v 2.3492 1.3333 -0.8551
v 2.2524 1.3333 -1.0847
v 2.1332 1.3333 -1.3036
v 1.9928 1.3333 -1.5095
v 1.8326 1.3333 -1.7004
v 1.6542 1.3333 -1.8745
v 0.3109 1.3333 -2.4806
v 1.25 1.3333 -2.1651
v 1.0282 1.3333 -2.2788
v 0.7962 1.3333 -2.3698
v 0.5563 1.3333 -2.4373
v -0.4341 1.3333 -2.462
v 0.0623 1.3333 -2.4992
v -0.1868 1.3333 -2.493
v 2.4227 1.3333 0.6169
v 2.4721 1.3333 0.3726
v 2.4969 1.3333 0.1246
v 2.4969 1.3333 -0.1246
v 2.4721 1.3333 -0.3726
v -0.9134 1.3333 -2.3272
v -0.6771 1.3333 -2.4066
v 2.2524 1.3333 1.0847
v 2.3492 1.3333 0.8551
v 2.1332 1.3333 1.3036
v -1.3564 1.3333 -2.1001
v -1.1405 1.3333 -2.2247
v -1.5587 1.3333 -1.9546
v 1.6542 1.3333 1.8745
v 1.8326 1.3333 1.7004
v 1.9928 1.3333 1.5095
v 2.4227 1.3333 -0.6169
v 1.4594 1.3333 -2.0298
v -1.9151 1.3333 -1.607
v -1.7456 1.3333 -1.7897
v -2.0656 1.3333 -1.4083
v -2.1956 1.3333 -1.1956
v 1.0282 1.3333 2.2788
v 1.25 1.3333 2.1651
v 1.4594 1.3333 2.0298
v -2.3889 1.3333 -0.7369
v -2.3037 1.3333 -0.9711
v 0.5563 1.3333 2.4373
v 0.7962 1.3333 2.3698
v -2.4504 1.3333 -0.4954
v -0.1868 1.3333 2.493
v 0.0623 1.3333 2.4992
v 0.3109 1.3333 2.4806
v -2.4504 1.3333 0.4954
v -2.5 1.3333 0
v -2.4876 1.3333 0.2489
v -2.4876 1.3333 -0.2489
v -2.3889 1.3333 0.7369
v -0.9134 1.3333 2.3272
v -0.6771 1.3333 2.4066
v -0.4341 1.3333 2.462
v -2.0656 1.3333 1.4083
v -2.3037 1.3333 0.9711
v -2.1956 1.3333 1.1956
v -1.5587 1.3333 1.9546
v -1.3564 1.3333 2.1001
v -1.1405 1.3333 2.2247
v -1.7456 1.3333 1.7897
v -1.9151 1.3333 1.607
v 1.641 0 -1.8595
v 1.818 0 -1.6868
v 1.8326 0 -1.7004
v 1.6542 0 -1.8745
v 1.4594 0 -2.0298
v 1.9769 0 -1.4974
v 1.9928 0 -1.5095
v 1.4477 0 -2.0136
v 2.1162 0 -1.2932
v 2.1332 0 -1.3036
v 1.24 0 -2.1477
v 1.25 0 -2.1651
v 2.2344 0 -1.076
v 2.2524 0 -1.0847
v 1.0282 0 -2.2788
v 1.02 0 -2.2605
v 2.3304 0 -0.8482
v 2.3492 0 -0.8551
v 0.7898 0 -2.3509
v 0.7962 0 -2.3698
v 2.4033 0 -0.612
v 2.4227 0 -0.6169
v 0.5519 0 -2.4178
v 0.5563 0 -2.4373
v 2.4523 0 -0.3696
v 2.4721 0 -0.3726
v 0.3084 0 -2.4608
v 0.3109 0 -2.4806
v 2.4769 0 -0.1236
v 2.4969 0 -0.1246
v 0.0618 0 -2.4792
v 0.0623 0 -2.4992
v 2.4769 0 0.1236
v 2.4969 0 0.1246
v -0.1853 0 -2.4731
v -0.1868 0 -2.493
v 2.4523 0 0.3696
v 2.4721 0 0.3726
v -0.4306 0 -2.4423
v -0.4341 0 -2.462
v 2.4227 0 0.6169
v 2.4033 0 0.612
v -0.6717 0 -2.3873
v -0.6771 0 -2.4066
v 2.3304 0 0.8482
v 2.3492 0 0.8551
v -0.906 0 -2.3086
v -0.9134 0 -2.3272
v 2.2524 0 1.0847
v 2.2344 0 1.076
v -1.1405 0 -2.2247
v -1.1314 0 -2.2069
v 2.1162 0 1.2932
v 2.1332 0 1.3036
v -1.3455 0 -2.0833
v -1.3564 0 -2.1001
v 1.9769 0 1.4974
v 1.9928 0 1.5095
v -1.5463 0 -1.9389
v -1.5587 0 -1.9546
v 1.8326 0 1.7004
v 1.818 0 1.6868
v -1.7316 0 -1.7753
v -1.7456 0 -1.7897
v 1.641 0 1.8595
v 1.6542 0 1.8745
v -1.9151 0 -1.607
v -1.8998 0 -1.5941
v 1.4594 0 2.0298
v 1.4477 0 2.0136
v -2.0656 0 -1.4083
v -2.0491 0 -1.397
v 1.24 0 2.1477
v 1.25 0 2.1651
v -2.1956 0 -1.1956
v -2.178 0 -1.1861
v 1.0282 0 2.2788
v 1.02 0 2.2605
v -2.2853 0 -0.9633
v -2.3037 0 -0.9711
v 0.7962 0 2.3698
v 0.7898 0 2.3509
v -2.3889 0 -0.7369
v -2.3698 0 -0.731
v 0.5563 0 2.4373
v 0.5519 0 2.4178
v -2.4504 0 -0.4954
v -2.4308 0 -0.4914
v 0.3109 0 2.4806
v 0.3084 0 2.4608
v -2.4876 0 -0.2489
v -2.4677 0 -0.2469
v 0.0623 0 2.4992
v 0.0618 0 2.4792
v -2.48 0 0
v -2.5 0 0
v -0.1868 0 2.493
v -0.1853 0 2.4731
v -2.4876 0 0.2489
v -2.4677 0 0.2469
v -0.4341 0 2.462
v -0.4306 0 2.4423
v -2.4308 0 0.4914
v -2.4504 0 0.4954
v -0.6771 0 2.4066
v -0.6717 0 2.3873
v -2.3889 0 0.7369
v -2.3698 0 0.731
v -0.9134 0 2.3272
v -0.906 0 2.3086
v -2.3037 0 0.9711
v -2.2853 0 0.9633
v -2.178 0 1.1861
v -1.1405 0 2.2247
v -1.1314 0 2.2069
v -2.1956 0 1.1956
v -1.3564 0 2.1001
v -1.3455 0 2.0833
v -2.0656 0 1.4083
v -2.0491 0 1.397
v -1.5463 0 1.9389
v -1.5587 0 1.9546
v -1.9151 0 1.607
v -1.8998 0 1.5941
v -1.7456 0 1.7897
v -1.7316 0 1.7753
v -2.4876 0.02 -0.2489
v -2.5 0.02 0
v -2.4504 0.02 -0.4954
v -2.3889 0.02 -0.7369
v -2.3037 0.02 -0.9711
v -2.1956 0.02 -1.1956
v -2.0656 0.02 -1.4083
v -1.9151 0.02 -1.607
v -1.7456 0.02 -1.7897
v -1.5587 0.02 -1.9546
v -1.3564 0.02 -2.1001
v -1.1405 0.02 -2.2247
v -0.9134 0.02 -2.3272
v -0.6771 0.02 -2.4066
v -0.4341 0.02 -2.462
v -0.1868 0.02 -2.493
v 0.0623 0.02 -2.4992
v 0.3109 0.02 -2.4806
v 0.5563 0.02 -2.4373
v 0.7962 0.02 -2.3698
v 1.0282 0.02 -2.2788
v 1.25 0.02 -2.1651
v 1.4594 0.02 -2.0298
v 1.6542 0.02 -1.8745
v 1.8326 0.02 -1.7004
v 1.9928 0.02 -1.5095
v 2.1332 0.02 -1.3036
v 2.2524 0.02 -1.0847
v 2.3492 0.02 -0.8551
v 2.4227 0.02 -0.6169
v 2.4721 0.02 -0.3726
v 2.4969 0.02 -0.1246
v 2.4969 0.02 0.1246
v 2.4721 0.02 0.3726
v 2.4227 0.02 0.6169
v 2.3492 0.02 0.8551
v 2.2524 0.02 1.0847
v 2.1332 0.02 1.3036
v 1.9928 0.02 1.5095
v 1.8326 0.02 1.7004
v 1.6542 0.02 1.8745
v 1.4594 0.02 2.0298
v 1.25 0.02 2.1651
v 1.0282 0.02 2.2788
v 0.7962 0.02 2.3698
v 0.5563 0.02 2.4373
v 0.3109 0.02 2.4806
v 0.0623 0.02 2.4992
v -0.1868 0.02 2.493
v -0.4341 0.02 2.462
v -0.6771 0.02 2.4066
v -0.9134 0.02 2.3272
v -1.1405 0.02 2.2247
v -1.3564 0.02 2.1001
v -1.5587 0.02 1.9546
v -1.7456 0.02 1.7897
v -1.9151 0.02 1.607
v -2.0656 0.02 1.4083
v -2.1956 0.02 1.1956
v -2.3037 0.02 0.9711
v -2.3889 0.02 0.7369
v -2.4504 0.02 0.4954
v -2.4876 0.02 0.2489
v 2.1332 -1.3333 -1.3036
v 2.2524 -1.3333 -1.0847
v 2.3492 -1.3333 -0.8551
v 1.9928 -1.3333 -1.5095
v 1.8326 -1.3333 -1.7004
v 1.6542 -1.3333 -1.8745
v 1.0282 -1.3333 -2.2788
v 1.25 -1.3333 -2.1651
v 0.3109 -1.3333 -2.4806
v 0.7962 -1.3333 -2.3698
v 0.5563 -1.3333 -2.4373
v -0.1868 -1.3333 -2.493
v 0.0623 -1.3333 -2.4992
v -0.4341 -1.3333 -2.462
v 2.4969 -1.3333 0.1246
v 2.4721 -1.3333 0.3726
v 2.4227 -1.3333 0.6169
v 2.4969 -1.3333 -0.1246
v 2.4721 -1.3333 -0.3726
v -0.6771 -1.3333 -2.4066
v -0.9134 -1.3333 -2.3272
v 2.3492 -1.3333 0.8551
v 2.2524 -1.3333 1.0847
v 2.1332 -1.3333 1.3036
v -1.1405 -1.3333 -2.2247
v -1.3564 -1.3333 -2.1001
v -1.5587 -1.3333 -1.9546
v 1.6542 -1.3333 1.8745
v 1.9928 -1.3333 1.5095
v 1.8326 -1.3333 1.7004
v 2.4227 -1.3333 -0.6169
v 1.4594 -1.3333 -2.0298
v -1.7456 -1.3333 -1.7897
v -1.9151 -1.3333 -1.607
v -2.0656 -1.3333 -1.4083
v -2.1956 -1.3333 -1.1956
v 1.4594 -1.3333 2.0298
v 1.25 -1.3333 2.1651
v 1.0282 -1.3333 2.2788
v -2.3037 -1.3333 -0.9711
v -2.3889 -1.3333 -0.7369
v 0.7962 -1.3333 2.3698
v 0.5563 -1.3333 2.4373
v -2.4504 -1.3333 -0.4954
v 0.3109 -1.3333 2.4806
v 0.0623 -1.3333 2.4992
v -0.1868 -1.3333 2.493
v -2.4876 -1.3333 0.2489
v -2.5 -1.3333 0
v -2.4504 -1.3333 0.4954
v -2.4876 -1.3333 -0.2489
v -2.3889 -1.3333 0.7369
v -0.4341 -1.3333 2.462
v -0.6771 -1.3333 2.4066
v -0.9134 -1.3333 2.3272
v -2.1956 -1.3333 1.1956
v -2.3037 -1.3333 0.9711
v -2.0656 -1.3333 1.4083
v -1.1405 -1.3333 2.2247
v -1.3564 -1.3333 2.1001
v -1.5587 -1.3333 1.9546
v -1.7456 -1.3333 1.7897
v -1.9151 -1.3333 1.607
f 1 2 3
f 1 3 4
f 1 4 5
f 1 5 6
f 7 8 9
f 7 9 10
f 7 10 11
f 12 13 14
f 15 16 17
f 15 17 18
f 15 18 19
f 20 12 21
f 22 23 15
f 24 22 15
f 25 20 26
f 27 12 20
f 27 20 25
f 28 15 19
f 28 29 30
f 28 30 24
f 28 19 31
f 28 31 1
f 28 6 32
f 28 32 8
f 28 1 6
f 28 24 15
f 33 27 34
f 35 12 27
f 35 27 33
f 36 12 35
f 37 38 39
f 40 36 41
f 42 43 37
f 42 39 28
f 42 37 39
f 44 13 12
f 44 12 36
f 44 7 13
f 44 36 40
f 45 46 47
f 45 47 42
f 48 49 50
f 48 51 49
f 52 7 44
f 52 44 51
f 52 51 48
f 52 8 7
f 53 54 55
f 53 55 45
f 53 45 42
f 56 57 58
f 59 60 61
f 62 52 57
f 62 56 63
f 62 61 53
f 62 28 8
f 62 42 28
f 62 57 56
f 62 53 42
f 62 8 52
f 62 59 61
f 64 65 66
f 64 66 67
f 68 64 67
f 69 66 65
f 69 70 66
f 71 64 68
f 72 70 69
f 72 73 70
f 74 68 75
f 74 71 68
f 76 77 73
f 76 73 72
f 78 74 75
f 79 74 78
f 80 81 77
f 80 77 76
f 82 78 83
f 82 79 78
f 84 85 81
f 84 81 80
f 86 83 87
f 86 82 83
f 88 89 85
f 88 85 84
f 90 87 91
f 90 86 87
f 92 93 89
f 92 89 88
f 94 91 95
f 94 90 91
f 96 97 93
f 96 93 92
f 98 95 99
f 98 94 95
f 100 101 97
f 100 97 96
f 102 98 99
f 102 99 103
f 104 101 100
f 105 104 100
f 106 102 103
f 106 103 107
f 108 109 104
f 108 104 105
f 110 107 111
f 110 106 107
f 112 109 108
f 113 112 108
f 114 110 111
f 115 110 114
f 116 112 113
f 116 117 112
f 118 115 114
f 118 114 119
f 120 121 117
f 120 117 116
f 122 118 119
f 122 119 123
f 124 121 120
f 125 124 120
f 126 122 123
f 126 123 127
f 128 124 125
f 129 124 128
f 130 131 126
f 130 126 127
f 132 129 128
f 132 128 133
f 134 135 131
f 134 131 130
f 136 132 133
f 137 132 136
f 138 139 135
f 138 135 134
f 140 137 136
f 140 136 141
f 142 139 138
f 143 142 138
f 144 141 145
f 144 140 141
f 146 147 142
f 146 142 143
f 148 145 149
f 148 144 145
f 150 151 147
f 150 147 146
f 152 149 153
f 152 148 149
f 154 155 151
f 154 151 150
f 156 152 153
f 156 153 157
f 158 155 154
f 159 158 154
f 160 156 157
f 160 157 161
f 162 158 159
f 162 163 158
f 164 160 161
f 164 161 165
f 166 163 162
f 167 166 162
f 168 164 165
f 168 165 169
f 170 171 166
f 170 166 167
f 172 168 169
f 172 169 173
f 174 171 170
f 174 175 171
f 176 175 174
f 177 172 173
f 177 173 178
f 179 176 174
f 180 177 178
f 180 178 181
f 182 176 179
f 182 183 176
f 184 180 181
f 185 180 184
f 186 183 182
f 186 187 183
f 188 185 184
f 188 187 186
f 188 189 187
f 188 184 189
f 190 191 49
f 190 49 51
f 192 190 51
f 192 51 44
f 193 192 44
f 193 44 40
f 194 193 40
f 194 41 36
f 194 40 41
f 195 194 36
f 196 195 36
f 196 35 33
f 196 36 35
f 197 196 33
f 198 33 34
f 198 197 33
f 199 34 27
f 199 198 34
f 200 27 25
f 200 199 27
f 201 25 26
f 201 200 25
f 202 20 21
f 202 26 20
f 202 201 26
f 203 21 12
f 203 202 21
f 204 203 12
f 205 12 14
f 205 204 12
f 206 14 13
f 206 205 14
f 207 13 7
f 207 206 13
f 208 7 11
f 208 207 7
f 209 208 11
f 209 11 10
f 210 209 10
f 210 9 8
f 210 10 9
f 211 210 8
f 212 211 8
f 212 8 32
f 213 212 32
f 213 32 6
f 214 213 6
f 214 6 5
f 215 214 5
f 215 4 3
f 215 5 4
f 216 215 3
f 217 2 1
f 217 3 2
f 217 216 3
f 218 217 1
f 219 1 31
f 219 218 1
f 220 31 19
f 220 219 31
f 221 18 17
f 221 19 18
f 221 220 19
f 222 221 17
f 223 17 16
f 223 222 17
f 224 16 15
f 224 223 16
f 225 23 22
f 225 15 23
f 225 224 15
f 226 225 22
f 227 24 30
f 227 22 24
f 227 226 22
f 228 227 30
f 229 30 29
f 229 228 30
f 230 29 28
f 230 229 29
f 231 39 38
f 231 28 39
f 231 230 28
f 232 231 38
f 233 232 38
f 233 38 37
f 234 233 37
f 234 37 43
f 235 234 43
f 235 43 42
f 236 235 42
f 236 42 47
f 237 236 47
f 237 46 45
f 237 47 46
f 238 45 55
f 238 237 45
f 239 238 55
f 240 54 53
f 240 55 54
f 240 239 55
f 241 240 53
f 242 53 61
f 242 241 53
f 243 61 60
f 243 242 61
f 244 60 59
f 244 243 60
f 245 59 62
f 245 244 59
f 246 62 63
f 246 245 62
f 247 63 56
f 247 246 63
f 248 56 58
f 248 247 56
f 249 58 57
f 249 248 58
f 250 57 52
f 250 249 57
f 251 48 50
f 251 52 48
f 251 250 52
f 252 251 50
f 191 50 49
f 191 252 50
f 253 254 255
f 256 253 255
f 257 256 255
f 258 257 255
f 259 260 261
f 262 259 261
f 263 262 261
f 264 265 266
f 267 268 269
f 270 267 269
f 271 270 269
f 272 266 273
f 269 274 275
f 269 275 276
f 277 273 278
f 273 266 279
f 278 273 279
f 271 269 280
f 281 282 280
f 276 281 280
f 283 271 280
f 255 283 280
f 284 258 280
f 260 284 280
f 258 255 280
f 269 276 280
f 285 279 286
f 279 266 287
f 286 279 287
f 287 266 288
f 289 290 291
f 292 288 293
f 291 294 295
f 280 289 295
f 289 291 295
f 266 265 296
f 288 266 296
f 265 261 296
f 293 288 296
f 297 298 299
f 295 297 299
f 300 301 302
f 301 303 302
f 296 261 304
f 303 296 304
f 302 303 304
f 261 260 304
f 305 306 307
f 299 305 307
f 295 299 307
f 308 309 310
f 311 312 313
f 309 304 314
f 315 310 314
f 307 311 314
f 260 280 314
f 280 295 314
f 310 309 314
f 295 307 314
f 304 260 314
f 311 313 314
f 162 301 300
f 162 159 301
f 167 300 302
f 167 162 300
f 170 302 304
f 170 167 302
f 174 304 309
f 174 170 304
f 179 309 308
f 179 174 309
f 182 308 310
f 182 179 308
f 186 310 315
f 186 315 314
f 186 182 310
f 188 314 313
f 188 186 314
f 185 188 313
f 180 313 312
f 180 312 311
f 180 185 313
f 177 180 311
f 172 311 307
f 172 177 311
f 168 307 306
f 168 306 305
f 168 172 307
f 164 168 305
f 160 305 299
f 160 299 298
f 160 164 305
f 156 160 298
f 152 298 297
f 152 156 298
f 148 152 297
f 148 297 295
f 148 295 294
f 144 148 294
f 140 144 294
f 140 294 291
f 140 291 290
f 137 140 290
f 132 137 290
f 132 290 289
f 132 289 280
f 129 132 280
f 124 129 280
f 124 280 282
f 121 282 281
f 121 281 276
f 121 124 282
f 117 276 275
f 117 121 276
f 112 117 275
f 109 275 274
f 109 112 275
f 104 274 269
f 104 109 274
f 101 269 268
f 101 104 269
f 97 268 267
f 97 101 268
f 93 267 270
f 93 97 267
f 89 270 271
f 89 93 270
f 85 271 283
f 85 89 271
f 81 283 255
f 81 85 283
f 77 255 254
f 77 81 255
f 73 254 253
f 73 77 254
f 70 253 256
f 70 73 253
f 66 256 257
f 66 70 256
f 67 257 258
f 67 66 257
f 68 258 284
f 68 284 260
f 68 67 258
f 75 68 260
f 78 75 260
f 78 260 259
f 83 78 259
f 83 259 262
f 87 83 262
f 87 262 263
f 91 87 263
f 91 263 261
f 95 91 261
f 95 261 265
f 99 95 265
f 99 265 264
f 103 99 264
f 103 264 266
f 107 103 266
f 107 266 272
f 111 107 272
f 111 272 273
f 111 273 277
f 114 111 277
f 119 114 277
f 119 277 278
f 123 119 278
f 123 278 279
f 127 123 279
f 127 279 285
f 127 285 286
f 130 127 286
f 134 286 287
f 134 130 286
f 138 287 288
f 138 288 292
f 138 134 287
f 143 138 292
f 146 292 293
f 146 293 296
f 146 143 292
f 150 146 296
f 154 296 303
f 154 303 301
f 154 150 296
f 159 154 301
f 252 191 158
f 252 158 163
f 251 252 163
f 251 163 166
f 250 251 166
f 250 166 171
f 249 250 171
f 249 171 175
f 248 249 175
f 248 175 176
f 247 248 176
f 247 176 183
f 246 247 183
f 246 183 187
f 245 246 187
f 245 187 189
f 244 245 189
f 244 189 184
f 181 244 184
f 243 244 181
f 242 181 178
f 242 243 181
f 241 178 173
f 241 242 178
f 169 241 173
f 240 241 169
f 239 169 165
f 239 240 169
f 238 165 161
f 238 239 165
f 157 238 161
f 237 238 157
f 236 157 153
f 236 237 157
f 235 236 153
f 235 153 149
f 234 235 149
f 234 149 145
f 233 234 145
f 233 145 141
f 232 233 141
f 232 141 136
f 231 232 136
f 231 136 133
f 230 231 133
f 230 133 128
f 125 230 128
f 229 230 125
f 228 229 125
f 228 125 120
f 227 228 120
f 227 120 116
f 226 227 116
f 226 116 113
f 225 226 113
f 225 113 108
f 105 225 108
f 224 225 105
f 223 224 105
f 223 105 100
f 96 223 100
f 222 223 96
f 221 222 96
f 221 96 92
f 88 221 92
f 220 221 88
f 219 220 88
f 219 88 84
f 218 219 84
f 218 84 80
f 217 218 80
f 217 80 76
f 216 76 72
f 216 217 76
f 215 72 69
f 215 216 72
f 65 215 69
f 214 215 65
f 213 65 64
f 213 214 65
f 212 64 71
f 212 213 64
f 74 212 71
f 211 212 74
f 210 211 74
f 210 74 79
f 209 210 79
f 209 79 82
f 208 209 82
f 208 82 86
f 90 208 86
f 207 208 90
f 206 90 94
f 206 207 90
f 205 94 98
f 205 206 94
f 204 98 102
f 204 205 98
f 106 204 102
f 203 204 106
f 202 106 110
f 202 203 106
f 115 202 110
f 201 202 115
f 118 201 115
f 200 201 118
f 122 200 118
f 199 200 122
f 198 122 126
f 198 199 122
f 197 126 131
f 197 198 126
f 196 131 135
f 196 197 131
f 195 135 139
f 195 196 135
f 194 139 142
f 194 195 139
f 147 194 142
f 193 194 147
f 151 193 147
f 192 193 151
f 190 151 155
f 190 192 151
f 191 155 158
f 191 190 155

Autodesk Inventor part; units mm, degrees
ref_plane "YZ Plane" through (0, 0, 0) normal (1, 0, 0) x (0, 1, 0)
ref_plane "XZ Plane" through (0, 0, 0) normal (0, 1, 0) x (-1, 0, 0)
ref_plane "XY Plane" through (0, 0, 0) normal (0, 0, 1) x (1, 0, 0)
sketch "Sketch1" plane through (0, 0, 0) normal (0, 1, 0) x (-1, 0, 0)
  circle A0 centre (0, 0) radius 2.5
  dimension "d0" = 5
extrude "Extrusion1" add sketch "Sketch1" along normal blind 1.3333
chamfer "Chamfer1" distance 0.02 angle 45 1 edges at (2.5, 0, 0)
extrude "Extrusion2" add sketch "Sketch1" against normal blind 1.3333
equation "\"d0\" = sensorMagnet_diameter"
equation "\"d1\" = 0.5 * sensorMagnet_height"
equation "\"d6\" = 0.5 * sensorMagnet_height"
equation "\"gap\" = 0.1"
equation "\"airgap\" = 0.4"
equation "\"driveMagnet_height\" = 5"
equation "\"halbachMagnet_height\" = 3"
equation "\"sensorMagnet_diameter\" = 5"
equation "\"sensorMagnet_height\" = 2.66667"
equation "\"wallgap\" = 2"
equation "\"motorRadius\" = 2 * gap + driveMagnet_centerSpacingRadius + driveMagnet_length + 2 * wallgap"
equation "\"shaftDiameter\" = 8"
equation "\"flangeBearing_outerDiameter\" = 16"
equation "\"flangeBearing_innerDiameter\" = shaftDiameter"
equation "\"flangeBearing_height\" = 5"
equation "\"flangeBearing_flangeHeight\" = 1"
equation "\"flangeBearing_flangeDiameter\" = 18"
equation "\"magnetTrapNut_height\" = 1.2"
equation "\"magnetTrapNut_sideToSide\" = 4"
equation "\"magnetTrapBolt_headHeight\" = 2"
equation "\"magnetTrapBolt_headDiameter\" = 3.98"
equation "\"magnetTrapBolt_diameter\" = 2"
equation "\"statorThickness\" = coilThickness + 2 * wallgap"
equation "\"rotor_mountingLipHeight\" = 0.5 * statorThickness"
equation "\"magnetTrapHexNut_sideToSide\" = 4"
equation "\"magnetTrapSquareNut_sideLength\" = 4"
equation "\"magnetTrapSquareNut_height\" = 1.2"
equation "\"magnetTrapHexNut_height\" = 1.2"
equation "\"rotorRadius\" = 2 * gap + driveMagnet_centerSpacingRadius + driveMagnet_length + wallgap"
equation "\"rotorBandSquareNut_sideLength\" = 4"
equation "\"rotorBandHexNut_height\" = 1.2"
equation "\"rotorBandHexNut_sideToSide\" = 4"
equation "\"rotorBandSquareNut_height\" = 1.2"
equation "\"rotorBandBolt_headHeight\" = 2"
equation "\"rotorBandBolt_headDiameter\" = 3.98"
equation "\"rotorBandBolt_diameter\" = 2"
equation "\"rotorBandThickness\" = wallgap + rotorBandBolt_headHeight + gap"
equation "\"flangeCoupling_collarOuterDiameter\" = 16"
equation "\"flangeCoupling_flangeHoleEdgeToEdge\" = 2.05"
equation "\"flangeCoupling_innerDiameter\" = shaftDiameter"
equation "\"flangeCoupling_flangeHoleDiameter\" = 3.9"
equation "\"flangeCoupling_flangeHeight\" = 3.1"
equation "\"flangeCoupling_flangeDiameter\" = 32"
equation "\"flangeCoupling_height\" = flangeCoupling_collarHeight + flangeCoupling_flangeHeight"
equation "\"flangeCoupling_mountHoleDiameter\" = 3.9"
equation "\"flangeCoupling_mountHoleEdgeToEdge\" = 2.05"
equation "\"statorRadius\" = driveMagnet_length + driveMagnet_centerSpacingRadius + 2 * gap"
equation "\"coilThickness\" = 12"
equation "\"statorMountBolt_diameter\" = 4"
equation "\"statorMountBolt_headDiameter\" = 7"
equation "\"statorMountBolt_headHeight\" = 4"
equation "\"statorMountBolt_shaftLength\" = coilThickness + flangeCoupling_flangeHeight + wallgap"
equation "\"statorMountHexNut_height\" = 4"
equation "\"statorMountHexNut_sideToSide\" = 8"
equation "\"sensorMagnet_ringRadius\" = 0.5 * driveMagnet_centerSpacingRadius + 2 * wallgap"
equation "\"coil_percentCoverage\" = 0.6"
equation "\"statorSpokeDegrees\" = 4deg"
equation "\"coil_bulge\" = 3"
equation "\"statorCoilBolt_shaftLength\" = coilThickness"
equation "\"statorCoilHexNut_height\" = 1.2"
equation "\"statorCoilBolt_headHeight\" = 2"
equation "\"statorCoilBolt_diameter\" = 2"
equation "\"statorCoilBolt_headDiameter\" = 3.98"
equation "\"statorCoilHexNut_sideToSide\" = 4"
equation "\"magnetWire_outerDiameter\" = 0.8128"
equation "\"printingLayerHeight\" = 0.2"
equation "\"circuitBoard_height\" = 1.6"
equation "\"hallEffectSensor_width\" = 1.6"
equation "\"hallEffectSensor_length\" = 3"
equation "\"hallEffectSensor_height\" = 1.1"
equation "\"hallEffectSensor_pinLength\" = 0.6"
equation "\"circuitboardMountHexNut_height\" = 1.2"
equation "\"circuitboardMountHexNut_sideToSide\" = 4"
equation "\"circuitboardMountBolt_headHeight\" = 2"
equation "\"circuitboardMountBolt_shaftLength\" = coilThickness"
equation "\"circuitboardMountBolt_diameter\" = 2"
equation "\"circuitboardMountBolt_headDiameter\" = 3.98"
equation "\"statorShellBolt_headDiameter\" = 5.68"
equation "\"statorShellHexNut_height\" = 2.3"
equation "\"statorShellBolt_shaftLength\" = statorThickness - statorShellBolt_countersinkDepth"
equation "\"statorShellBolt_headHeight\" = 3"
equation "\"statorShellHexNut_sideToSide\" = 5.3"
equation "\"statorShellBolt_diameter\" = 3"
equation "\"driveMagnet_centerSpacingRadius\" = 38.96113"
equation "\"driveMagnet_length\" = 60"
equation "\"flangeCoupling_collarHeight\" = 10"
equation "\"statorShellBolt_countersinkDepth\" = 3.4"
properties part number "SensorMagnet"
